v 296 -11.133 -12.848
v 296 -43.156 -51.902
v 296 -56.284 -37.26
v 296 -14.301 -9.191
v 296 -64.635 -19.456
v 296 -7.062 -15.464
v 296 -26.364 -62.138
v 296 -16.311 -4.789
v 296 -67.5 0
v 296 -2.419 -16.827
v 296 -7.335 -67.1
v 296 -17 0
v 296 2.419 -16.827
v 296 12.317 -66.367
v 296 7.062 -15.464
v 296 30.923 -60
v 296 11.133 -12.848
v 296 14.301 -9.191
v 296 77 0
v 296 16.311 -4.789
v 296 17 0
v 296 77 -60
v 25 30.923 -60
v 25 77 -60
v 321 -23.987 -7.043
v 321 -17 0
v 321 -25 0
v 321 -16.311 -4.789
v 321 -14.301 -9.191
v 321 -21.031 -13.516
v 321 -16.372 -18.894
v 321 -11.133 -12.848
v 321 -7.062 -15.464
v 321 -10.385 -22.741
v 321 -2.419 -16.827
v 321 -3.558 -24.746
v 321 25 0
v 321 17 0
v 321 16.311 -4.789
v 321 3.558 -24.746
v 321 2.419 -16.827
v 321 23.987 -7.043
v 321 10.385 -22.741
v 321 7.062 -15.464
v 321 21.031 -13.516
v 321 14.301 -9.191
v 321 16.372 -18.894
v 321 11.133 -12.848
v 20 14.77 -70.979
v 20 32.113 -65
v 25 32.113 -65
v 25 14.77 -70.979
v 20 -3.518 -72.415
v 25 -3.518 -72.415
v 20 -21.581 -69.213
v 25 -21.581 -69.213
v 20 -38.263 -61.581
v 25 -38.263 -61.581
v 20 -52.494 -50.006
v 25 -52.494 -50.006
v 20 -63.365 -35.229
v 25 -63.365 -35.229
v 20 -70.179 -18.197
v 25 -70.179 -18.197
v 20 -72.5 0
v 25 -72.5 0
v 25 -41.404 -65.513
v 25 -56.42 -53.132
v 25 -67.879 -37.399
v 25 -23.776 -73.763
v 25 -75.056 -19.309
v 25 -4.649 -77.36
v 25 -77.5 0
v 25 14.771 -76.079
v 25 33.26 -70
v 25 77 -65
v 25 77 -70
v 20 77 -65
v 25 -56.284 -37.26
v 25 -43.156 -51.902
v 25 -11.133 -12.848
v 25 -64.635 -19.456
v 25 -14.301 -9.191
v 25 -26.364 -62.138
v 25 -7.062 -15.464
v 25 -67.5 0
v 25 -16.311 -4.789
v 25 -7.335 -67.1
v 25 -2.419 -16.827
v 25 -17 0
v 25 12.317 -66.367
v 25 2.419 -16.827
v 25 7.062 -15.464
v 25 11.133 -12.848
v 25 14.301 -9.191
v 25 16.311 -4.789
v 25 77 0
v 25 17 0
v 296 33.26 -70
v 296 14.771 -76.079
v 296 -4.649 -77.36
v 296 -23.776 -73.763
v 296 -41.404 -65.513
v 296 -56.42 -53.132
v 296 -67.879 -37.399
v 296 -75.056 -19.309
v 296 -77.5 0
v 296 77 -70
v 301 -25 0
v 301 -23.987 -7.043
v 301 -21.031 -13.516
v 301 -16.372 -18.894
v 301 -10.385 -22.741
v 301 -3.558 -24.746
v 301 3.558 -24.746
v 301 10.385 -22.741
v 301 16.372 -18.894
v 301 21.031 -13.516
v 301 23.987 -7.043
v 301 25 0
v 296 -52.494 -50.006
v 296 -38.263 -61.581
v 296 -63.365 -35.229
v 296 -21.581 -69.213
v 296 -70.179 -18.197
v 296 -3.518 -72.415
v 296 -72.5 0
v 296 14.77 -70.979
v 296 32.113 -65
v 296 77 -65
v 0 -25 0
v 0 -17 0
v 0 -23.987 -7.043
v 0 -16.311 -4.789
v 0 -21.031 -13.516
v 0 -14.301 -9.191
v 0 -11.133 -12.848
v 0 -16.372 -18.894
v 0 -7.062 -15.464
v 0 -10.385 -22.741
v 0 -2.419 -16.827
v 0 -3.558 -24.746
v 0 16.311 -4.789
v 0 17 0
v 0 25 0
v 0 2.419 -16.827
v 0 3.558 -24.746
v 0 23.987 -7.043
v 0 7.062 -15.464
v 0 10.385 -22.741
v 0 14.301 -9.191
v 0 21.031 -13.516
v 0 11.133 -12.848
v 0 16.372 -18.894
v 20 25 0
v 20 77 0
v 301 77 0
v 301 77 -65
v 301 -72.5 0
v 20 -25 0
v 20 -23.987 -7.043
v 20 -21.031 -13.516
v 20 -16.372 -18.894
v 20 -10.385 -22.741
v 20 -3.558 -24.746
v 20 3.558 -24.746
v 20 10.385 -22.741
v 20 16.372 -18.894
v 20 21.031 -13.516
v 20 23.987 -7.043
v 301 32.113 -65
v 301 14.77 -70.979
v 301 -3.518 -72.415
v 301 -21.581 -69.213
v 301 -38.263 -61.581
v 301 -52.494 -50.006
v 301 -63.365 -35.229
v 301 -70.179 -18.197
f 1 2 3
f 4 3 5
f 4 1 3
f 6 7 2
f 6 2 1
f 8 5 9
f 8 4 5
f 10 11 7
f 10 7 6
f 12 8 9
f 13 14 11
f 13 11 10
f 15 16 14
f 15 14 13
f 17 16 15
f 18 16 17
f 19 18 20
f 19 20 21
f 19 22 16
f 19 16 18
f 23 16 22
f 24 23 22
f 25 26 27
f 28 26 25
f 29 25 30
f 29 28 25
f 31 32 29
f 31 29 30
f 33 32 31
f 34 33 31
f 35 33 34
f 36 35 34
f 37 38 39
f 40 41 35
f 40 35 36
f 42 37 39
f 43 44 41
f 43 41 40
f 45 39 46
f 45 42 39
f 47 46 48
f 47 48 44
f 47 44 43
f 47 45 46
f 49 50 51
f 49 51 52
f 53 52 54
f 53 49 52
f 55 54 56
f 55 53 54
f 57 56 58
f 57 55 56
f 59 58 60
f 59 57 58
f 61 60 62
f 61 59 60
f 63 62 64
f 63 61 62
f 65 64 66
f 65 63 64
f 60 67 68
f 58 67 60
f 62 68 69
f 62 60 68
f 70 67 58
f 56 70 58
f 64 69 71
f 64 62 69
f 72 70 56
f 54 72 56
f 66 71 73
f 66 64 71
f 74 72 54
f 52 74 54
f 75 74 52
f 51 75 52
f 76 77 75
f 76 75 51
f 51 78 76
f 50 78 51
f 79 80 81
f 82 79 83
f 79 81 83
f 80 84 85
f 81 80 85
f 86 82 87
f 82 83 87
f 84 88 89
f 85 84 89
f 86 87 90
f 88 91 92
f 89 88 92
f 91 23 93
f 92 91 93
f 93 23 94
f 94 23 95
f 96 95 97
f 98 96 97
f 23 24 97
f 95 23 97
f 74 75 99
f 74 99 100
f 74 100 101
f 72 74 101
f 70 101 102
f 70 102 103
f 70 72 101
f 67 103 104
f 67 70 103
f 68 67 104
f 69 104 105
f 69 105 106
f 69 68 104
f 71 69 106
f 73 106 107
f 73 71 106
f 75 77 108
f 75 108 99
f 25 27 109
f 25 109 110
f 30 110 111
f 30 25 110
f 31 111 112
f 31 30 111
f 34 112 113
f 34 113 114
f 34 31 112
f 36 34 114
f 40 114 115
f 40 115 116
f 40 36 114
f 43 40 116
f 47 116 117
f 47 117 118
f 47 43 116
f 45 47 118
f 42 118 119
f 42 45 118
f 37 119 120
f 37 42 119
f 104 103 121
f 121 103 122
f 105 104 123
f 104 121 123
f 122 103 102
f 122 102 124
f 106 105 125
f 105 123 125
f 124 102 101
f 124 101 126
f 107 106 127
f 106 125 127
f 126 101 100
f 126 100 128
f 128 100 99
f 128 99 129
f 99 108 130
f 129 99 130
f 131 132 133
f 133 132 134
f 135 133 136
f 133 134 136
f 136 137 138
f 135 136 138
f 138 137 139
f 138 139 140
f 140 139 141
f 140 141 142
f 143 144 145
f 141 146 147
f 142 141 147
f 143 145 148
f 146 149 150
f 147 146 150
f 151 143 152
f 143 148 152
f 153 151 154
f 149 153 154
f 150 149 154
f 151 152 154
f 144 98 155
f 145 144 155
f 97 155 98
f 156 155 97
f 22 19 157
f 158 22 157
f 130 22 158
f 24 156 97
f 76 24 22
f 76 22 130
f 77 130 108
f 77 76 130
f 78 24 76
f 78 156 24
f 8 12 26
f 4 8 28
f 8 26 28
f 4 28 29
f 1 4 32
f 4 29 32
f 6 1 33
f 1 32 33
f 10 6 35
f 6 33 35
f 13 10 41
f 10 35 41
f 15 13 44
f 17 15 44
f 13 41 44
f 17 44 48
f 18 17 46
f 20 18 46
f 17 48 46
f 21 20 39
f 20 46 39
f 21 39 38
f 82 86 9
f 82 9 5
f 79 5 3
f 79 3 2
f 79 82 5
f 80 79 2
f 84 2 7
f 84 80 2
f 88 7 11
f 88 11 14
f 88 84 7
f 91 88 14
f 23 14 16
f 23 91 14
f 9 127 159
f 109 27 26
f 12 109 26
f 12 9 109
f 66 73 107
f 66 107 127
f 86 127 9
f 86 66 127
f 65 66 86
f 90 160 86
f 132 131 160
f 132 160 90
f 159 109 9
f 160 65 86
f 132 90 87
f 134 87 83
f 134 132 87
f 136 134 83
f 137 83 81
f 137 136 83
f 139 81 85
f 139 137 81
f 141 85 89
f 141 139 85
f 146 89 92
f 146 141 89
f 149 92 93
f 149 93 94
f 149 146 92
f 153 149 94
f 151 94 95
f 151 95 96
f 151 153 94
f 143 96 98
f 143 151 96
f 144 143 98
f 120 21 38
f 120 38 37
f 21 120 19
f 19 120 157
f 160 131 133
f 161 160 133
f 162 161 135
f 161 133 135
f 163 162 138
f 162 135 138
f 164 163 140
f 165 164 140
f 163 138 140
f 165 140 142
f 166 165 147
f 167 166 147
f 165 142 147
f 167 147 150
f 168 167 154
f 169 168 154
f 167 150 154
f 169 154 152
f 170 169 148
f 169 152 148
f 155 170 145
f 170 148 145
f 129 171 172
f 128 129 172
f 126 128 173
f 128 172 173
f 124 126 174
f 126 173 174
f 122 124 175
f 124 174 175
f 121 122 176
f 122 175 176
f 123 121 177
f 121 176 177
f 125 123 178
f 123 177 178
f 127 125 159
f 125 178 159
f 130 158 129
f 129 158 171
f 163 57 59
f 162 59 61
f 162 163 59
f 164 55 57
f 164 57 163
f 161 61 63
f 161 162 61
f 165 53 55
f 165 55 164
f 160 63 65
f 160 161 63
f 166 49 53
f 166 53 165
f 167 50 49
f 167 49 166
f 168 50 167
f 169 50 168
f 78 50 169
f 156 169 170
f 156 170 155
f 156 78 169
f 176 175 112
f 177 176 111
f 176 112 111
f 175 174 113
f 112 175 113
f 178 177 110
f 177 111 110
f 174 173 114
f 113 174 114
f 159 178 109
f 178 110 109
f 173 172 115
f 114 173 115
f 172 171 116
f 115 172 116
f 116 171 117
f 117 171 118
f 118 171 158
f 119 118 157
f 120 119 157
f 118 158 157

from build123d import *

# Parameters (mm, degrees)
Y_KSEKLIK_EKSTR_ZYON1_DEPTH = 20
Y_KSEKLIK_EKSTR_ZYON2_DEPTH = 5
EKSTR_ZYON_NCE4_DEPTH       = 271


with BuildPart() as part:
    # Çizim1 → Yükseklik-Ekstrüzyon1 (new body)
    with BuildSketch(Plane(origin=(0, 0, 0), x_dir=(0, 0, -1), z_dir=(1, 0, 0))):
        with BuildLine():
            Line((0, 25), (0, 17))
            ThreePointArc((0, 17), (17, 0), (0, -17))
            Line((0, -17), (0, -25))
            ThreePointArc((0, -25), (25, 0), (0, 25))
        make_face()
    extrude(amount=Y_KSEKLIK_EKSTR_ZYON1_DEPTH)

    # Çizim2 → Yükseklik-Ekstrüzyon2 (add)
    with BuildSketch(Plane(origin=(20, 0, 0), x_dir=(0, 0, -1), z_dir=(1, 0, 0))):
        with BuildLine():
            Line((0, 17), (0, 77))
            Line((0, 77), (65, 77))
            Line((65, 77), (65, 32.113081447))
            ThreePointArc((65, 32.113081447), (61.581037686, -38.262590053), (0, -72.5))
            Line((0, -72.5), (0, -17))
            ThreePointArc((0, -17), (17, 0), (0, 17))
        make_face()
    extrude(amount=Y_KSEKLIK_EKSTR_ZYON2_DEPTH)


with BuildPart() as body_2:
    # Aynalama4: mirrored copy
    add(part.part.mirror(Plane(origin=(160.5, 0, 0), x_dir=(0, 0, 1), z_dir=(1, 0, 0))))


with BuildPart() as part_1:
    add(part.part)

    add(body_2.part)  # Ekstrüzyon-İnce4 merges body 2
    # Çizim9 → Ekstrüzyon-İnce4 (add)
    with BuildSketch(Plane(origin=(25, 0, 0), x_dir=(0, 0, -1), z_dir=(1, 0, 0))):
        with BuildLine():
            ThreePointArc((0, -67.5), (57.634938288, -35.134938288), (60, 30.923292192))
            Line((60, 30.923292192), (60, 77))
            Line((60, 77), (70, 77))
            Line((70, 77), (70, 33.260336739))
            ThreePointArc((70, 33.260336739), (65.513075402, -41.4039485), (0, -77.5))
            Line((0, -77.5), (0, -67.5))
        make_face()
    extrude(amount=EKSTR_ZYON_NCE4_DEPTH)


solid = part_1.part
